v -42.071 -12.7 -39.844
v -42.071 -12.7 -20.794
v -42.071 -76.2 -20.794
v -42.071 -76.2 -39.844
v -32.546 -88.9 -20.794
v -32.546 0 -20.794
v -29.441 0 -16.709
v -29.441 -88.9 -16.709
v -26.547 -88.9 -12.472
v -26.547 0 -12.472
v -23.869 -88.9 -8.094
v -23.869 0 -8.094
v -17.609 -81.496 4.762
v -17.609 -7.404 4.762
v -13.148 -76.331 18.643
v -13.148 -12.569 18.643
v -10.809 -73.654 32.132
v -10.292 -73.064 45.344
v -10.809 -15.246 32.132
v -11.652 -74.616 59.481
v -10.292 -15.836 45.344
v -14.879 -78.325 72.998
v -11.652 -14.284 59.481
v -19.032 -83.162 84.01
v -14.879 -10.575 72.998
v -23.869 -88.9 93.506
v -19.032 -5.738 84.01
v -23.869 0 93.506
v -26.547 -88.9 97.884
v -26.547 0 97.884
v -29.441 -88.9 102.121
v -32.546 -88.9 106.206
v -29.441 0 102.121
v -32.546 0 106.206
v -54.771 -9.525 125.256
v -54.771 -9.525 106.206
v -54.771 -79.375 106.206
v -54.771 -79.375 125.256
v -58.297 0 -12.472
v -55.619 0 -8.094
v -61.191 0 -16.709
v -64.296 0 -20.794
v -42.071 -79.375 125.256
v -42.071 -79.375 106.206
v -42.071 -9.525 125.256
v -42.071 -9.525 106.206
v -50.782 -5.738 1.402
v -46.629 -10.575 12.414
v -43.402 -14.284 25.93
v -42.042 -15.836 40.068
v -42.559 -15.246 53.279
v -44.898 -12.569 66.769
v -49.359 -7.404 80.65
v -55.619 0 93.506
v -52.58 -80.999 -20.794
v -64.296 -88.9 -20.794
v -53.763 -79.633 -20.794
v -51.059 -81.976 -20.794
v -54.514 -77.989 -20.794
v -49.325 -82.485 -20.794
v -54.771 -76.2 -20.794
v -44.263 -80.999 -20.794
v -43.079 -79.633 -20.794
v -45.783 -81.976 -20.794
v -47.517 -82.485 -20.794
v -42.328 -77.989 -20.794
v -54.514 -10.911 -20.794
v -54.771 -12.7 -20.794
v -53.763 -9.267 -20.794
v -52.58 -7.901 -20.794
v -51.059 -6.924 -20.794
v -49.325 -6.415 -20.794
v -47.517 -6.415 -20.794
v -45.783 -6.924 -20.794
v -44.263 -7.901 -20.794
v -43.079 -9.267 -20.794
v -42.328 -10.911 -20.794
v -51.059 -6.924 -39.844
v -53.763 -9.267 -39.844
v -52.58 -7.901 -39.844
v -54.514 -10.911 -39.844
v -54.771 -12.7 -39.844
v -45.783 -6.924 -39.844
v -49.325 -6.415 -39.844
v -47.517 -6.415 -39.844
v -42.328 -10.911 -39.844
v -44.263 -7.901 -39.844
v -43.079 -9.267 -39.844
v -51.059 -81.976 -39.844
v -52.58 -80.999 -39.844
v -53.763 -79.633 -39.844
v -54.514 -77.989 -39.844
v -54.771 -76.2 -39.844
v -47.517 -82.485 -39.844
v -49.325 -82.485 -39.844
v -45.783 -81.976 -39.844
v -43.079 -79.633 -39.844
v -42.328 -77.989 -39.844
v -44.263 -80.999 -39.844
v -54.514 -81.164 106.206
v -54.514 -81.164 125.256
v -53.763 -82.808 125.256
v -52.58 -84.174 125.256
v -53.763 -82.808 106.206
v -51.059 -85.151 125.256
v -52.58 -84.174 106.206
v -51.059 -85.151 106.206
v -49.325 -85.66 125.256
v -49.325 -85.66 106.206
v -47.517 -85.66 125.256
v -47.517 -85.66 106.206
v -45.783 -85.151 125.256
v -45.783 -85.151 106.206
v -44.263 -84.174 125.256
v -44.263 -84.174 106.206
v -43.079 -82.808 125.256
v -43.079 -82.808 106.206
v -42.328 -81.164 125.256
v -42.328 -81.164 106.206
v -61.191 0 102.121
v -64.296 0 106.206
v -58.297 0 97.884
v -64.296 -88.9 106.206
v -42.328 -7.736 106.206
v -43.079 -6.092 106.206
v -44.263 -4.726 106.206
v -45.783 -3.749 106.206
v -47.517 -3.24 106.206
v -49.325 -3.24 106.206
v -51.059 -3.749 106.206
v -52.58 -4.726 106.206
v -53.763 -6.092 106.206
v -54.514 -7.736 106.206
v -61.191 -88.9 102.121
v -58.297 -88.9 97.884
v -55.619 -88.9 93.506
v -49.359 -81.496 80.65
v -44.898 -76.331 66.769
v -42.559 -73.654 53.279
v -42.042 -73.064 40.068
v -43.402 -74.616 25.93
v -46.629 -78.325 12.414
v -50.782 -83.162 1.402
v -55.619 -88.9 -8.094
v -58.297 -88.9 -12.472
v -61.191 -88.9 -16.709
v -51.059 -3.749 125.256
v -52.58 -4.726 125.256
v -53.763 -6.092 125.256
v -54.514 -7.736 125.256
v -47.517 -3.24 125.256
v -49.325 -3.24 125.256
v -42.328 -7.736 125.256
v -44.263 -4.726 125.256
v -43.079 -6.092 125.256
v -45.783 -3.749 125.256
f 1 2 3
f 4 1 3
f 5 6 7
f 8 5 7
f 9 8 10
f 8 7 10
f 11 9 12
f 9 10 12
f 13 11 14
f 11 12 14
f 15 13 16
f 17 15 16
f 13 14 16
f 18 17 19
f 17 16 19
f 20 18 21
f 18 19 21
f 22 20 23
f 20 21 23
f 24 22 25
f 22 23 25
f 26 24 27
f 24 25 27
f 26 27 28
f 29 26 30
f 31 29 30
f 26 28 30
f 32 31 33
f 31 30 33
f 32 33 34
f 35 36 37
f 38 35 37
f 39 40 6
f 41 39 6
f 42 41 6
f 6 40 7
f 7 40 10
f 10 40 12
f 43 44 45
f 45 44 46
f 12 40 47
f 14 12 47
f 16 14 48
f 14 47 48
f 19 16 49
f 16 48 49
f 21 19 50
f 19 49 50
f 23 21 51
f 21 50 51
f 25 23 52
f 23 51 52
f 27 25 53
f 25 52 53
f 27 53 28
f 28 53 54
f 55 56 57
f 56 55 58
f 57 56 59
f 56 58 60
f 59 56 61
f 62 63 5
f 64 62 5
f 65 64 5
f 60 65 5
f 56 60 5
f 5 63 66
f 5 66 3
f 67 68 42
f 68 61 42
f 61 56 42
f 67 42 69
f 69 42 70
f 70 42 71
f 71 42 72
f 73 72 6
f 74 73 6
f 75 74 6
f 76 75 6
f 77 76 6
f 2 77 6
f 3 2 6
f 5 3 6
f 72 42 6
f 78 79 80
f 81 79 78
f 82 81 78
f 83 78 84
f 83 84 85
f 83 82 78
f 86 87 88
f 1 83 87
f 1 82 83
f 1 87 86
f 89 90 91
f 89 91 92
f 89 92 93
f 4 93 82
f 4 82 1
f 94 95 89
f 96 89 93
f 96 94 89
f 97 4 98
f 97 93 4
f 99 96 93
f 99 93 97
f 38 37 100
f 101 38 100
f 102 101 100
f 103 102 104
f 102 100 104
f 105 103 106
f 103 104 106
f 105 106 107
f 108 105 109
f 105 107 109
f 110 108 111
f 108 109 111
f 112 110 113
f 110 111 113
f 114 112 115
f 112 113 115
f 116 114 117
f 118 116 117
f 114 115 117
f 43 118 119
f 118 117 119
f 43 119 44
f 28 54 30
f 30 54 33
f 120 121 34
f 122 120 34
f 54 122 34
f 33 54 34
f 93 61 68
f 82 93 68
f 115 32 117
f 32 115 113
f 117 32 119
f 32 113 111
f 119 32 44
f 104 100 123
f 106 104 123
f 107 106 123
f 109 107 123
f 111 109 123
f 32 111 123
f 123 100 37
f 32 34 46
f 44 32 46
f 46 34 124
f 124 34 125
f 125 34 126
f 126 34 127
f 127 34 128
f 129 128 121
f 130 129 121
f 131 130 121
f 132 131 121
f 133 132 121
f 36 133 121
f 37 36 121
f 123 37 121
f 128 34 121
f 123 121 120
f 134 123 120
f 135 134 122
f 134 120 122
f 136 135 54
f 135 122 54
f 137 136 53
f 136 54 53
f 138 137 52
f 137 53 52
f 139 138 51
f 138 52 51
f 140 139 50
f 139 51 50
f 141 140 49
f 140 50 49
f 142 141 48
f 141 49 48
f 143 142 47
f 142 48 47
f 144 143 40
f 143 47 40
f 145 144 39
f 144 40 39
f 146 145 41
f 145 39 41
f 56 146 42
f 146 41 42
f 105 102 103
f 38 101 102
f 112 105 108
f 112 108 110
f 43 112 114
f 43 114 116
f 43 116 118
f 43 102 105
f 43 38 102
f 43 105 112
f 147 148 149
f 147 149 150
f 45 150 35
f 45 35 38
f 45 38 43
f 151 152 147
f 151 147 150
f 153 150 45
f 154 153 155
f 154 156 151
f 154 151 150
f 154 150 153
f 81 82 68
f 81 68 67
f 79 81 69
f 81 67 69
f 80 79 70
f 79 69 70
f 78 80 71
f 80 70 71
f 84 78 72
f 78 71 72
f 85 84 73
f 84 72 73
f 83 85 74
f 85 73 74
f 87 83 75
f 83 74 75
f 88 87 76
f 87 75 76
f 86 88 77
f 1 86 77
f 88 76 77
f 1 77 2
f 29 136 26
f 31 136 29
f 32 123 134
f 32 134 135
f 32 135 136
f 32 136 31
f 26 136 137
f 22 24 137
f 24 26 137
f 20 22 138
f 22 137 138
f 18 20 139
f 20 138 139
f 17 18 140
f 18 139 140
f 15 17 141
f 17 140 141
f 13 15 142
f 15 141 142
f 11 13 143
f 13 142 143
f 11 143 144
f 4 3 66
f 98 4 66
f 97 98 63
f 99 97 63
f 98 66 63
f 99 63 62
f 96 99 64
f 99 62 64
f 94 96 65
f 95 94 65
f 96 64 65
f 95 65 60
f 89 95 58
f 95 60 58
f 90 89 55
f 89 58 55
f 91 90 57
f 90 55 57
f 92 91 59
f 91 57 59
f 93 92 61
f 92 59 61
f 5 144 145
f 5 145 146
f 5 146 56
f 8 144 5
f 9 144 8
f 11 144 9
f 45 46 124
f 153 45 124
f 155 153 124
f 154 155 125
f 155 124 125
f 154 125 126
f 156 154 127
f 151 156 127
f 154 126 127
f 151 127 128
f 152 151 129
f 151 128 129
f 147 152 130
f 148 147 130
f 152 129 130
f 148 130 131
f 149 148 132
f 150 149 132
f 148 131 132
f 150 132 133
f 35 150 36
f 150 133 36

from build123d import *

# Parameters (mm, degrees)
F1_DEPTH = 88.9
F3_DEPTH = 19.05
F5_DEPTH = 19.05
F8_DEPTH = 54.0395254203


with BuildPart() as f1:
    # F0 (on Front) → F1 (new body)
    with BuildSketch(Plane.XZ):
        with BuildLine():
            Line((-32.5461814261, -20.7940909142), (-32.5461814261, 106.2059090858))
            Line((-32.5461814261, 106.2059090858), (-64.2961814261, 106.2059090858))
            ThreePointArc((-64.2961814261, 106.2059090858), (-42.0076560058, 42.7059090858), (-64.2961814261, -20.7940909142))
            Line((-64.2961814261, -20.7940909142), (-32.5461814261, -20.7940909142))
        make_face()
        with BuildLine():
            ThreePointArc((-32.5461814261, -20.7940909142), (-10.2576560058, 42.7059090858), (-32.5461814261, 106.2059090858))
            Line((-32.5461814261, 106.2059090858), (-32.5461814261, -20.7940909142))
        make_face()
    extrude(amount=F1_DEPTH)

    # F2 (on face) → F3 (join)
    with BuildSketch(Plane(origin=(0, 0, -20.7940909142), x_dir=(1, 0, 0), z_dir=(0, 0, -1))):
        with BuildLine():
            Line((-42.0711814261, 12.7), (-42.0711814261, 76.2))
            ThreePointArc((-42.0711814261, 76.2), (-48.4211814261, 82.55), (-54.7711814261, 76.2))
            Line((-54.7711814261, 76.2), (-54.7711814261, 12.7))
            ThreePointArc((-54.7711814261, 12.7), (-48.4211814261, 6.35), (-42.0711814261, 12.7))
        make_face()
    extrude(amount=F3_DEPTH)

    # F4 (on face) → F5 (join)
    with BuildSketch(Plane.XY.offset(106.2059090858)):
        with BuildLine():
            Line((-42.0711817384, -79.375), (-42.0711817384, -9.525))
            ThreePointArc((-42.0711817384, -9.525), (-48.4211817384, -3.175), (-54.7711817384, -9.525))
            Line((-54.7711817384, -9.525), (-54.7711817384, -79.375))
            ThreePointArc((-54.7711817384, -79.375), (-48.4211817384, -85.725), (-42.0711817384, -79.375))
        make_face()
    extrude(amount=F5_DEPTH)

    # F7 (on 3pt) → F8 (cut, through all)
    with BuildSketch(Plane(origin=(-64.2961814261, 0, 0), x_dir=(0, -1, 0), z_dir=(-1, 0, 0))):
        with BuildLine():
            Line((-11.4886816591, -8.6150756106), (0, -8.0940909142))
            ThreePointArc((0, -8.0940909142), (15.875, 42.7059090858), (0, 93.5059090858))
            Line((0, 93.5059090858), (-11.4886816591, 93.5059090858))
            Line((-11.4886816591, 93.5059090858), (-11.4886816591, -8.6150756106))
        make_face()
        with BuildLine():
            ThreePointArc((88.9, 93.5059090858), (73.025, 42.7059090858), (88.9, -8.0940909142))
            Line((88.9, -8.0940909142), (100.3886816591, -8.6150756106))
            Line((100.3886816591, -8.6150756106), (100.3886816591, 93.5059090858))
            Line((100.3886816591, 93.5059090858), (88.9, 93.5059090858))
        make_face()
    extrude(amount=-F8_DEPTH, mode=Mode.SUBTRACT)


solid = f1.part
